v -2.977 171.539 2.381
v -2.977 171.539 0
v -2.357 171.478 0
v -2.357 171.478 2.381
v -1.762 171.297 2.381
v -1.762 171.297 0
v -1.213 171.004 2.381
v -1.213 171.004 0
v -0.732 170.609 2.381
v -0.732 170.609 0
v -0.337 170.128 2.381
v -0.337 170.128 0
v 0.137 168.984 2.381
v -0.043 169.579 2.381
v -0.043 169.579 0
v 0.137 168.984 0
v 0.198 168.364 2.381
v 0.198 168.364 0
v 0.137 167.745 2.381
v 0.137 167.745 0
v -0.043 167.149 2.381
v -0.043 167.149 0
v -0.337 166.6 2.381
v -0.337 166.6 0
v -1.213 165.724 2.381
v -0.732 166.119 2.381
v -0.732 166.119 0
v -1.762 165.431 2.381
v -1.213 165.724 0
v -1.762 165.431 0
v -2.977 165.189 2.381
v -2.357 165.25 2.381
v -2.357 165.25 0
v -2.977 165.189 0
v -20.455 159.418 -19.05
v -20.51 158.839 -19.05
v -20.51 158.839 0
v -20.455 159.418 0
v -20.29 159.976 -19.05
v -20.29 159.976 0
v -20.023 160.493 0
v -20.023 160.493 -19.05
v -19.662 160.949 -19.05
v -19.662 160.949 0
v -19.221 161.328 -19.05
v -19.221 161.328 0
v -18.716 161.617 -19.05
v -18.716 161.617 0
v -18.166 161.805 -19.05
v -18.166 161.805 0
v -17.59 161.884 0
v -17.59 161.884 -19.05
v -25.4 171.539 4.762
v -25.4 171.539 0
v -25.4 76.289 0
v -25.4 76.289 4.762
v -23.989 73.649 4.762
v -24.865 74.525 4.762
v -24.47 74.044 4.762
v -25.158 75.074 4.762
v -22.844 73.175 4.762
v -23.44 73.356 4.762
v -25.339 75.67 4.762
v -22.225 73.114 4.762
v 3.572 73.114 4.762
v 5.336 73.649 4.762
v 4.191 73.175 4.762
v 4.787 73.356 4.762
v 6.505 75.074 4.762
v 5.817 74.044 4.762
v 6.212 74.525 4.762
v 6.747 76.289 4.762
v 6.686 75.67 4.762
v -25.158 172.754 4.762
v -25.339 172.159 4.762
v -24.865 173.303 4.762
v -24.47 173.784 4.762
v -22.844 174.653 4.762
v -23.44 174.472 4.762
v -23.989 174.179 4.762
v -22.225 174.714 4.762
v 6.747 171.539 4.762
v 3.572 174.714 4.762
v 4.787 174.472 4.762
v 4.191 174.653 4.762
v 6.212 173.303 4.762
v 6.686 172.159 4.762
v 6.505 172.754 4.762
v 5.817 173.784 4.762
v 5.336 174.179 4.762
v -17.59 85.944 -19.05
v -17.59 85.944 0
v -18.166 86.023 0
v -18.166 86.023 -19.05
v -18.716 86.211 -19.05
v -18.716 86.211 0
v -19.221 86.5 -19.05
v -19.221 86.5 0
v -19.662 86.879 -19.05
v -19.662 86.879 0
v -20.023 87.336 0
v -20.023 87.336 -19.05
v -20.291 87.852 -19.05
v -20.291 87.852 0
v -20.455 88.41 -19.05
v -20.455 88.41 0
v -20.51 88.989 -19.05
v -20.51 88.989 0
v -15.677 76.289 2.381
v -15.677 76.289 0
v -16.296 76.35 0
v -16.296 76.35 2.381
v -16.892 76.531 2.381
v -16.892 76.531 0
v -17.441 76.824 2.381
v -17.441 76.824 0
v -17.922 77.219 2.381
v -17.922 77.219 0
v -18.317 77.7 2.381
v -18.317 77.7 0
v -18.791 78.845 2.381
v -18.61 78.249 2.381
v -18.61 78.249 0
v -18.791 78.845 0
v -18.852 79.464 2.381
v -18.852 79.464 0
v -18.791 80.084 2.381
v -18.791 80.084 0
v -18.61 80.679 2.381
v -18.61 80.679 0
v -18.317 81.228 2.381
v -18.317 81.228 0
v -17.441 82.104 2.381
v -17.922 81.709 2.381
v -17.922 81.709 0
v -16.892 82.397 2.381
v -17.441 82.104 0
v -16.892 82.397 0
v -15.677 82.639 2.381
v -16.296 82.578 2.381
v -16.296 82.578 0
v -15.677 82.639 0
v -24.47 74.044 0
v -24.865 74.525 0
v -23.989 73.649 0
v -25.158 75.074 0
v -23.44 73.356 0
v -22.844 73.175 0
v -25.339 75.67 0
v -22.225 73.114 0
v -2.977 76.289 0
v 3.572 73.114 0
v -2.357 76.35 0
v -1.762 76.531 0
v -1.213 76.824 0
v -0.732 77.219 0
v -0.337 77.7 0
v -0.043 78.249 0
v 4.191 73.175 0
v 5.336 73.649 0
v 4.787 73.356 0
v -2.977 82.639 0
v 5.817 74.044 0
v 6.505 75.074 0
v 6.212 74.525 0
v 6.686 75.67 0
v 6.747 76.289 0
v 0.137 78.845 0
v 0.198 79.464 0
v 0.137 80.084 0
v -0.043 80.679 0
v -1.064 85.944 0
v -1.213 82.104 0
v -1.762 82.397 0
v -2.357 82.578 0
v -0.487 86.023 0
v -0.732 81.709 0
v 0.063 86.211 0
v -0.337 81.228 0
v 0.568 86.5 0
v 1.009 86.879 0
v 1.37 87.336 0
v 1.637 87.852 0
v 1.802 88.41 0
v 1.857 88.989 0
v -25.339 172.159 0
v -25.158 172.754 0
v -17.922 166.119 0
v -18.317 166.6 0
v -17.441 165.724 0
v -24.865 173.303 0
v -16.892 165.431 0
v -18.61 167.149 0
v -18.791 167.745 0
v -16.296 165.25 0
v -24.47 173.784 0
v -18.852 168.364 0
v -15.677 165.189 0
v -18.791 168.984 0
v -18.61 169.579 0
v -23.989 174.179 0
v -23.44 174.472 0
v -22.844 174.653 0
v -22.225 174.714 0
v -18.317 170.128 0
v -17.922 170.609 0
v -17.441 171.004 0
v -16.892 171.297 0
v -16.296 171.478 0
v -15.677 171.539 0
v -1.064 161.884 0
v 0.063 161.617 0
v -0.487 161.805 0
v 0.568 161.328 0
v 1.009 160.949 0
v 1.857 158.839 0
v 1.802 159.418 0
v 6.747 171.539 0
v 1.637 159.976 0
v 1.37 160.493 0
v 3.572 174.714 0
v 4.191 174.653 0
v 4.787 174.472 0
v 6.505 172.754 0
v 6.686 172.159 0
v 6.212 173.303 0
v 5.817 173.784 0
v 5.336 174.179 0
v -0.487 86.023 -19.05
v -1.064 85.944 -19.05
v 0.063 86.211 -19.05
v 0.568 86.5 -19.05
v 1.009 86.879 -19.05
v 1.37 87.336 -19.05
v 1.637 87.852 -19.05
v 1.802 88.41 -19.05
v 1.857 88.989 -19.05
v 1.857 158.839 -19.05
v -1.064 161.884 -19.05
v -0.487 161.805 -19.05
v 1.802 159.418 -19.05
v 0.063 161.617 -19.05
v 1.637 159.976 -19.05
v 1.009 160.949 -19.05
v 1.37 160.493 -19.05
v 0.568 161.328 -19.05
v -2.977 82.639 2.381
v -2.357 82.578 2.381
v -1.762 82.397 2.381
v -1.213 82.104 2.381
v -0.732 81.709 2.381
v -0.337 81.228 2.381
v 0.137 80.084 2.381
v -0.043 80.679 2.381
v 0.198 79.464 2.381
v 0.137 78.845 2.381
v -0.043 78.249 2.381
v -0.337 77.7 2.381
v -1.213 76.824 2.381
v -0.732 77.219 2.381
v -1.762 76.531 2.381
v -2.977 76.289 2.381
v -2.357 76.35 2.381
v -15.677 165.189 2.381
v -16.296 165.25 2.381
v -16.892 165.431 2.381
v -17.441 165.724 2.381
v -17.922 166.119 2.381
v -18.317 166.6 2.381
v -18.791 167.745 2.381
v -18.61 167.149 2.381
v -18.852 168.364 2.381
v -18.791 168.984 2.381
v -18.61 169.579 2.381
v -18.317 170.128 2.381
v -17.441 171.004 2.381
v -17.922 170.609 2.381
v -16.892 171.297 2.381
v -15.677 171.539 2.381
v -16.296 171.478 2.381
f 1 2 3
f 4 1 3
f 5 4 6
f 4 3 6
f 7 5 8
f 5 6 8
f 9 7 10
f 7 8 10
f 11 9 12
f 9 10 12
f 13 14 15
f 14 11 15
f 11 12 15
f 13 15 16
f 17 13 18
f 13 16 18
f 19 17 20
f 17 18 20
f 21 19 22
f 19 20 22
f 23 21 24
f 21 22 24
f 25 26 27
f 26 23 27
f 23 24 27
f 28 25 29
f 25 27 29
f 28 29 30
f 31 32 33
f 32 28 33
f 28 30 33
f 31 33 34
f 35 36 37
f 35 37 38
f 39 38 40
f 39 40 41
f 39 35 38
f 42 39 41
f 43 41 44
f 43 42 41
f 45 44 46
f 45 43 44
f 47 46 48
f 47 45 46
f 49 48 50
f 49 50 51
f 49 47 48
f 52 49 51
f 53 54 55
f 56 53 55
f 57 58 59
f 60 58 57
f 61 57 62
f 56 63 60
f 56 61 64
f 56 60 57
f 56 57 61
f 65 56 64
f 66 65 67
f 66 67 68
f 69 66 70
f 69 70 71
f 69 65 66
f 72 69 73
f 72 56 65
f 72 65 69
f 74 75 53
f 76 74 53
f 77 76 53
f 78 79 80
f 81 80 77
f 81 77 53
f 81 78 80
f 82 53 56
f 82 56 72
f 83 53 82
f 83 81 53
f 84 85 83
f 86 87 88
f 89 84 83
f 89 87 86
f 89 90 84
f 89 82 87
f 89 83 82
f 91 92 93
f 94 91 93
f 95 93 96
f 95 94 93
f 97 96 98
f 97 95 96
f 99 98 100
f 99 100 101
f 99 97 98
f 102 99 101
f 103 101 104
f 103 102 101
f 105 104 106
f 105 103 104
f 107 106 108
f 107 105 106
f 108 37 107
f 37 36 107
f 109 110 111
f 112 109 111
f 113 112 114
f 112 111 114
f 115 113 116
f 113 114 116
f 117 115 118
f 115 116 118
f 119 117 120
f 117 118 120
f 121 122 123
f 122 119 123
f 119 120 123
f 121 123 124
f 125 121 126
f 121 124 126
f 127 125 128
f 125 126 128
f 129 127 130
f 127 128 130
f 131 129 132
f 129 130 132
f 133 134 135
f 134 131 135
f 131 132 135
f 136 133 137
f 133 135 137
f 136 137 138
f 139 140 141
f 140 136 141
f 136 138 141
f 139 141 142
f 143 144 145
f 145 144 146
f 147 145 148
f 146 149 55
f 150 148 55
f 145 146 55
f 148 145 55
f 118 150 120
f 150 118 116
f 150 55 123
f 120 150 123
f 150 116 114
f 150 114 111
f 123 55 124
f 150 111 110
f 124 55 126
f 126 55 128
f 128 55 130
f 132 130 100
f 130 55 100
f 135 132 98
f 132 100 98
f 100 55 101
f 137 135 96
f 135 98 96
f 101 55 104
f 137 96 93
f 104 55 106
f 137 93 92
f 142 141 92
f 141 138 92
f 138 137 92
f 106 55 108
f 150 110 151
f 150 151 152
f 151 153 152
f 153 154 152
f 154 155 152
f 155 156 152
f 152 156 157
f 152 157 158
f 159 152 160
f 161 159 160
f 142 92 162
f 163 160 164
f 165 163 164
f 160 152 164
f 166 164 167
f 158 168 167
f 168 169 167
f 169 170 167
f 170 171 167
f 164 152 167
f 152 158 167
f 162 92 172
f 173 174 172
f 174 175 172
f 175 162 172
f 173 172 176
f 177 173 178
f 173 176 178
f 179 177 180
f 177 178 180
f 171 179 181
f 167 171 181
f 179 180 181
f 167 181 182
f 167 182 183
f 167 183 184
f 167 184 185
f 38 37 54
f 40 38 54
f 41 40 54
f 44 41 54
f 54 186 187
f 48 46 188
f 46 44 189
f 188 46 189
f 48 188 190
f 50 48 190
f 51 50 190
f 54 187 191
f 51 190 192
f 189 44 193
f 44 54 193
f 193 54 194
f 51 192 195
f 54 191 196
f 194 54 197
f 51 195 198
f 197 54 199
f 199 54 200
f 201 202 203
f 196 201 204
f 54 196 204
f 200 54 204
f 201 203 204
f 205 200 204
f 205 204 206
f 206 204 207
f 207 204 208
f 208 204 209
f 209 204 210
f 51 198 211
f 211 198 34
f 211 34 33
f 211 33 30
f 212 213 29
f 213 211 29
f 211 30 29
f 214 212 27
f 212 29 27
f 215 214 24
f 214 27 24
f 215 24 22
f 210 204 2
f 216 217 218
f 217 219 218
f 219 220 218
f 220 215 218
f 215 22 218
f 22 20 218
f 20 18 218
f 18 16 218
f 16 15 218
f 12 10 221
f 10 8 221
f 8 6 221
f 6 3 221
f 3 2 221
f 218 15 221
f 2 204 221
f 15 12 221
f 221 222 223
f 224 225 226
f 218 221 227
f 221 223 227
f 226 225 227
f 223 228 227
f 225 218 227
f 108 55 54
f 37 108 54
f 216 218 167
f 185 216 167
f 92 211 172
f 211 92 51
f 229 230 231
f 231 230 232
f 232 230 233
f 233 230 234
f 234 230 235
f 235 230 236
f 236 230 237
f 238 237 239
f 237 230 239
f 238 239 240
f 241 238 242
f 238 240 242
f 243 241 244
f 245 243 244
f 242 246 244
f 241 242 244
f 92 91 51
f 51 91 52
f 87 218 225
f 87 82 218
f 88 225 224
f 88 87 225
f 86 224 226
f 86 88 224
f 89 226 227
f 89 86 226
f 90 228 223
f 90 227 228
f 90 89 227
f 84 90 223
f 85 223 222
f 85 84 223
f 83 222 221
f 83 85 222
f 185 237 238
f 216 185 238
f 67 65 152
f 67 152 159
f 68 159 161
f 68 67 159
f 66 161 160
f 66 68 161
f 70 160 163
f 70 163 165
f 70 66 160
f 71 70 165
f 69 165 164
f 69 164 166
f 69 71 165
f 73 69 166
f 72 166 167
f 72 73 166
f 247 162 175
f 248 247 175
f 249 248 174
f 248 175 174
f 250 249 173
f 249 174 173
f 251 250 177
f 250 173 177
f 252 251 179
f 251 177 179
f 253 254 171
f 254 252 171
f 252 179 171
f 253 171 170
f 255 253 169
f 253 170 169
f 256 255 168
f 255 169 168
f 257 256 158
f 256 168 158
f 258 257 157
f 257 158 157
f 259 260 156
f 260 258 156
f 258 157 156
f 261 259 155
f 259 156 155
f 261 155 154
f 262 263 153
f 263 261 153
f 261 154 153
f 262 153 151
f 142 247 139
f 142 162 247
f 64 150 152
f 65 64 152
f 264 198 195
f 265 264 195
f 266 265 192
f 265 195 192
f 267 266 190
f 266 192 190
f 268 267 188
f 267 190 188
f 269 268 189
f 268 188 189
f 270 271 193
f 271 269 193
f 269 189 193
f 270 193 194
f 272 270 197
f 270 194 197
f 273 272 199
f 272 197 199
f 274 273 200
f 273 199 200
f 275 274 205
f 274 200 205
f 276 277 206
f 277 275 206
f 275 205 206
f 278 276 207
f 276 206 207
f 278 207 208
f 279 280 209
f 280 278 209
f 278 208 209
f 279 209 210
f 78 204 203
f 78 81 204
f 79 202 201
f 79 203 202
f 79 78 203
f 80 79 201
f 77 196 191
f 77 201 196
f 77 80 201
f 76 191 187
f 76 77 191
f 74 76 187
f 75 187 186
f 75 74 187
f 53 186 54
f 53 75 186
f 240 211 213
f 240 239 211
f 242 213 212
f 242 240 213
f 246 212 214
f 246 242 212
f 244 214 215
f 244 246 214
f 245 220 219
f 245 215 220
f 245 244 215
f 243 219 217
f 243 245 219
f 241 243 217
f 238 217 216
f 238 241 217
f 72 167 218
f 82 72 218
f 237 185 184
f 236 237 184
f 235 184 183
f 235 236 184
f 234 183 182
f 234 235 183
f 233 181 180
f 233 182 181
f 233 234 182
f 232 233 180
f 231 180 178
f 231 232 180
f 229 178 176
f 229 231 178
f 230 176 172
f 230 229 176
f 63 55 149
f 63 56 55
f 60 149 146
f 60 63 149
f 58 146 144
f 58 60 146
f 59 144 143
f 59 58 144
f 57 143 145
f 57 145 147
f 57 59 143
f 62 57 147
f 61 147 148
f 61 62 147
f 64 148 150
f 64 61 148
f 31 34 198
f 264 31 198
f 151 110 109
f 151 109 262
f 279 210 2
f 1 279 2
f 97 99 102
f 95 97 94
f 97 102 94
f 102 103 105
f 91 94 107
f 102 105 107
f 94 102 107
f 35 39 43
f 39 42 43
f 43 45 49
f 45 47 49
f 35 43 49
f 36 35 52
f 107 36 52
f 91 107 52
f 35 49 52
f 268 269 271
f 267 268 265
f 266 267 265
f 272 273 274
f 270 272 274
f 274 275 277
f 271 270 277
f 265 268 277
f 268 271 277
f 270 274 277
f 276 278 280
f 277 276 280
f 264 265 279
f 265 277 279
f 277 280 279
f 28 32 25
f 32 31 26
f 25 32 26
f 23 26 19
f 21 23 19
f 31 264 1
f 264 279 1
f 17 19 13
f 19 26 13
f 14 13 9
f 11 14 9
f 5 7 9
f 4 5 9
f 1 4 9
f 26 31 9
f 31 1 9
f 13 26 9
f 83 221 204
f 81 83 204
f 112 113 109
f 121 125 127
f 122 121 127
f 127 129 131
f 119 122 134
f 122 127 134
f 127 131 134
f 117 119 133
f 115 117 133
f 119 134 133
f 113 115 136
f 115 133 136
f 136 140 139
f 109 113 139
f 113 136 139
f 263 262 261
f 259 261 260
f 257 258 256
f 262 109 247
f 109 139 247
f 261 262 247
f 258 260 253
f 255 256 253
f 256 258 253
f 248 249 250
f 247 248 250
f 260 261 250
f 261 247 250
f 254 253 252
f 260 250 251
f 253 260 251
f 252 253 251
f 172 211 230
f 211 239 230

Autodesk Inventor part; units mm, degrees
ref_plane "YZ Plane" through (0, 0, 0) normal (1, 0, 0) x (0, 1, 0)
ref_plane "XZ Plane" through (0, 0, 0) normal (0, 1, 0) x (-1, 0, 0)
sketch "Sketch1" plane through (0, 0, 0) normal (0, 0, 1) x (1, 0, 0)
  line L0 (-18.6531, 0) -> (18.6531, 0)
  line L1 (18.6531, 0) -> (18.6531, 35.0141)
  line L2 (18.6531, 35.0141) -> (-18.6531, 35.0141)
  line L3 (-18.6531, 35.0141) -> (-18.6531, 0)
  line L4 (0, 0) -> (0, 35.0141) construction
  line L5 (-9.3266, 35.0141) -> (-9.3266, 0) construction
  line L6 (-1.8266, 0) -> (-1.8266, 145.5582) construction
  line L7 (-16.8266, 0) -> (-16.8266, 145.5582) construction
  line L8 (-16.8266, 145.5582) -> (-1.8266, 145.5582) construction
  line L9 (-25.4, 0) -> (25.4, 0) construction
  line L10 (25.4, 0) -> (25.4, 304.8) construction
  line L11 (25.4, 304.8) -> (-25.4, 304.8) construction
  line L12 (-25.4, 304.8) -> (-25.4, 0) construction
  line L13 (-25.4, 73.1141) -> (6.7469, 73.1141)
  line L14 (6.7469, 73.1141) -> (6.7469, 174.7141)
  line L15 (6.7469, 174.7141) -> (-25.4, 174.7141)
  line L16 (-25.4, 174.7141) -> (-25.4, 73.1141)
  line L17 (-20.6375, 85.8141) -> (1.9844, 85.8141)
  line L18 (1.9844, 85.8141) -> (1.9844, 162.0141)
  line L19 (1.9844, 162.0141) -> (-20.6375, 162.0141)
  line L20 (-20.6375, 162.0141) -> (-20.6375, 85.8141)
  line L21 (-17.4625, 162.0141) -> (-17.4625, 85.8141)
  line L22 (-1.1906, 85.8141) -> (-1.1906, 162.0141)
  line L23 (-15.6766, 168.3641) -> (-2.9766, 168.3641) construction
  line L24 (-15.6766, 171.5391) -> (-2.9766, 171.5391)
  line L25 (-2.9766, 165.1891) -> (-15.6766, 165.1891)
  arc A0 (-15.6766, 171.5391) -> (-15.6766, 165.1891) centre (-15.6766, 168.3641) ccw
  arc A1 (-2.9766, 165.1891) -> (-2.9766, 171.5391) centre (-2.9766, 168.3641) ccw
  line L26 (-15.6766, 79.4641) -> (-2.9766, 79.4641) construction
  line L27 (-15.6766, 76.2891) -> (-2.9766, 76.2891)
  line L28 (-2.9766, 82.6391) -> (-15.6766, 82.6391)
  arc A2 (-15.6766, 82.6391) -> (-15.6766, 76.2891) centre (-15.6766, 79.4641) ccw
  arc A3 (-2.9766, 76.2891) -> (-2.9766, 82.6391) centre (-2.9766, 79.4641) ccw
  point P0 (0, 0)
  point P1 (-9.3266, 168.3641)
  point P2 (-9.3266, 79.4641)
  dimension "d0" = 37.3062
  dimension "d1" = 35.0141
  dimension "d2" = 15
  dimension "d3" = 50.8
  dimension "d4" = 304.8
  dimension "d5" = 101.6
  dimension "d6" = 76.2
  dimension "d7" = 4.7625
  dimension "d8" = 4.7625
  dimension "d9" = 12.7
  dimension "d10" = 12.7
  dimension "d11" = 38.1
  dimension "d12" = 3.175
  dimension "d13" = 3.175
  dimension "d14" = 12.7
  dimension "d15" = 12.7
  dimension "d16" = 3.175
  dimension "d17" = 6.35
  dimension "d18" = 3.175
  dimension "d19" = 6.35
extrude "Extrusion1" add sketch "Sketch1" along normal blind 4.7625 contours L16 L15 L14 L13 | L20 L19 L21 L17 | L21 L19 L22 L17 | L22 L19 L18 L17 | L24 A1 L25 A0 | A2 L28 A3 L27
extrude "Extrusion2" cut sketch "Sketch1" along normal blind 2.3813 contours L24 A1 L25 A0 | A2 L28 A3 L27
extrude "Extrusion3" add sketch "Sketch1" against normal blind 19.05 contours L20 L19 L21 L17 | L22 L19 L18 L17
fillet "Fillet1" radius 3.175 8 edges at (-20.6375, 85.8141, -9.525) (1.9844, 85.8141, -9.525) (-20.6375, 162.0141, -9.525) (1.9844, 162.0141, -9.525) (6.7469, 73.1141, 2.3813) (-25.4, 73.1141, 2.3813) (-25.4, 174.7141, 2.3813) (6.7469, 174.7141, 2.3813)
ref_plane "Work Plane1" through (-9.3266, 85.8141, 0) normal (-1, 0, 0) x (0, 0, 1)
sketch "Sketch2" plane through (0, 0, -19.05) normal (0, 0, -1) x (-1, 0, 0)
  arc A0 (20.6375, 158.8391) -> (17.4625, 162.0141) centre (17.4625, 158.8391) ccw projected
  line L0 (17.4625, 162.0141) -> (17.4625, 85.8141) projected
  arc A1 (17.4625, 85.8141) -> (20.6375, 88.9891) centre (17.4625, 88.9891) ccw projected
  line L1 (20.6375, 88.9891) -> (20.6375, 158.8391) projected
  arc A2 (20.5105, 158.8391) -> (17.5895, 161.8844) centre (17.4625, 158.8391) ccw
  line L2 (20.5105, 158.8391) -> (20.5105, 88.9891)
  arc A3 (17.5895, 85.9437) -> (20.5105, 88.9891) centre (17.4625, 88.9891) ccw
  line L3 (17.5895, 85.9437) -> (17.5895, 161.8844)
  point P0 (0, 0)
  dimension "d27" = 0.127
extrude "Extrusion4" cut sketch "Sketch2" against normal up to surface (19.05 mm away)
mirror "Mirror1" about plane through (-9.3266, 85.8141, 0) normal (-1, 0, 0) of "Extrusion4"
equation "\"d9\" = d10"
properties part number "Maglock Aligner" material "Polyethylene, High Density"
